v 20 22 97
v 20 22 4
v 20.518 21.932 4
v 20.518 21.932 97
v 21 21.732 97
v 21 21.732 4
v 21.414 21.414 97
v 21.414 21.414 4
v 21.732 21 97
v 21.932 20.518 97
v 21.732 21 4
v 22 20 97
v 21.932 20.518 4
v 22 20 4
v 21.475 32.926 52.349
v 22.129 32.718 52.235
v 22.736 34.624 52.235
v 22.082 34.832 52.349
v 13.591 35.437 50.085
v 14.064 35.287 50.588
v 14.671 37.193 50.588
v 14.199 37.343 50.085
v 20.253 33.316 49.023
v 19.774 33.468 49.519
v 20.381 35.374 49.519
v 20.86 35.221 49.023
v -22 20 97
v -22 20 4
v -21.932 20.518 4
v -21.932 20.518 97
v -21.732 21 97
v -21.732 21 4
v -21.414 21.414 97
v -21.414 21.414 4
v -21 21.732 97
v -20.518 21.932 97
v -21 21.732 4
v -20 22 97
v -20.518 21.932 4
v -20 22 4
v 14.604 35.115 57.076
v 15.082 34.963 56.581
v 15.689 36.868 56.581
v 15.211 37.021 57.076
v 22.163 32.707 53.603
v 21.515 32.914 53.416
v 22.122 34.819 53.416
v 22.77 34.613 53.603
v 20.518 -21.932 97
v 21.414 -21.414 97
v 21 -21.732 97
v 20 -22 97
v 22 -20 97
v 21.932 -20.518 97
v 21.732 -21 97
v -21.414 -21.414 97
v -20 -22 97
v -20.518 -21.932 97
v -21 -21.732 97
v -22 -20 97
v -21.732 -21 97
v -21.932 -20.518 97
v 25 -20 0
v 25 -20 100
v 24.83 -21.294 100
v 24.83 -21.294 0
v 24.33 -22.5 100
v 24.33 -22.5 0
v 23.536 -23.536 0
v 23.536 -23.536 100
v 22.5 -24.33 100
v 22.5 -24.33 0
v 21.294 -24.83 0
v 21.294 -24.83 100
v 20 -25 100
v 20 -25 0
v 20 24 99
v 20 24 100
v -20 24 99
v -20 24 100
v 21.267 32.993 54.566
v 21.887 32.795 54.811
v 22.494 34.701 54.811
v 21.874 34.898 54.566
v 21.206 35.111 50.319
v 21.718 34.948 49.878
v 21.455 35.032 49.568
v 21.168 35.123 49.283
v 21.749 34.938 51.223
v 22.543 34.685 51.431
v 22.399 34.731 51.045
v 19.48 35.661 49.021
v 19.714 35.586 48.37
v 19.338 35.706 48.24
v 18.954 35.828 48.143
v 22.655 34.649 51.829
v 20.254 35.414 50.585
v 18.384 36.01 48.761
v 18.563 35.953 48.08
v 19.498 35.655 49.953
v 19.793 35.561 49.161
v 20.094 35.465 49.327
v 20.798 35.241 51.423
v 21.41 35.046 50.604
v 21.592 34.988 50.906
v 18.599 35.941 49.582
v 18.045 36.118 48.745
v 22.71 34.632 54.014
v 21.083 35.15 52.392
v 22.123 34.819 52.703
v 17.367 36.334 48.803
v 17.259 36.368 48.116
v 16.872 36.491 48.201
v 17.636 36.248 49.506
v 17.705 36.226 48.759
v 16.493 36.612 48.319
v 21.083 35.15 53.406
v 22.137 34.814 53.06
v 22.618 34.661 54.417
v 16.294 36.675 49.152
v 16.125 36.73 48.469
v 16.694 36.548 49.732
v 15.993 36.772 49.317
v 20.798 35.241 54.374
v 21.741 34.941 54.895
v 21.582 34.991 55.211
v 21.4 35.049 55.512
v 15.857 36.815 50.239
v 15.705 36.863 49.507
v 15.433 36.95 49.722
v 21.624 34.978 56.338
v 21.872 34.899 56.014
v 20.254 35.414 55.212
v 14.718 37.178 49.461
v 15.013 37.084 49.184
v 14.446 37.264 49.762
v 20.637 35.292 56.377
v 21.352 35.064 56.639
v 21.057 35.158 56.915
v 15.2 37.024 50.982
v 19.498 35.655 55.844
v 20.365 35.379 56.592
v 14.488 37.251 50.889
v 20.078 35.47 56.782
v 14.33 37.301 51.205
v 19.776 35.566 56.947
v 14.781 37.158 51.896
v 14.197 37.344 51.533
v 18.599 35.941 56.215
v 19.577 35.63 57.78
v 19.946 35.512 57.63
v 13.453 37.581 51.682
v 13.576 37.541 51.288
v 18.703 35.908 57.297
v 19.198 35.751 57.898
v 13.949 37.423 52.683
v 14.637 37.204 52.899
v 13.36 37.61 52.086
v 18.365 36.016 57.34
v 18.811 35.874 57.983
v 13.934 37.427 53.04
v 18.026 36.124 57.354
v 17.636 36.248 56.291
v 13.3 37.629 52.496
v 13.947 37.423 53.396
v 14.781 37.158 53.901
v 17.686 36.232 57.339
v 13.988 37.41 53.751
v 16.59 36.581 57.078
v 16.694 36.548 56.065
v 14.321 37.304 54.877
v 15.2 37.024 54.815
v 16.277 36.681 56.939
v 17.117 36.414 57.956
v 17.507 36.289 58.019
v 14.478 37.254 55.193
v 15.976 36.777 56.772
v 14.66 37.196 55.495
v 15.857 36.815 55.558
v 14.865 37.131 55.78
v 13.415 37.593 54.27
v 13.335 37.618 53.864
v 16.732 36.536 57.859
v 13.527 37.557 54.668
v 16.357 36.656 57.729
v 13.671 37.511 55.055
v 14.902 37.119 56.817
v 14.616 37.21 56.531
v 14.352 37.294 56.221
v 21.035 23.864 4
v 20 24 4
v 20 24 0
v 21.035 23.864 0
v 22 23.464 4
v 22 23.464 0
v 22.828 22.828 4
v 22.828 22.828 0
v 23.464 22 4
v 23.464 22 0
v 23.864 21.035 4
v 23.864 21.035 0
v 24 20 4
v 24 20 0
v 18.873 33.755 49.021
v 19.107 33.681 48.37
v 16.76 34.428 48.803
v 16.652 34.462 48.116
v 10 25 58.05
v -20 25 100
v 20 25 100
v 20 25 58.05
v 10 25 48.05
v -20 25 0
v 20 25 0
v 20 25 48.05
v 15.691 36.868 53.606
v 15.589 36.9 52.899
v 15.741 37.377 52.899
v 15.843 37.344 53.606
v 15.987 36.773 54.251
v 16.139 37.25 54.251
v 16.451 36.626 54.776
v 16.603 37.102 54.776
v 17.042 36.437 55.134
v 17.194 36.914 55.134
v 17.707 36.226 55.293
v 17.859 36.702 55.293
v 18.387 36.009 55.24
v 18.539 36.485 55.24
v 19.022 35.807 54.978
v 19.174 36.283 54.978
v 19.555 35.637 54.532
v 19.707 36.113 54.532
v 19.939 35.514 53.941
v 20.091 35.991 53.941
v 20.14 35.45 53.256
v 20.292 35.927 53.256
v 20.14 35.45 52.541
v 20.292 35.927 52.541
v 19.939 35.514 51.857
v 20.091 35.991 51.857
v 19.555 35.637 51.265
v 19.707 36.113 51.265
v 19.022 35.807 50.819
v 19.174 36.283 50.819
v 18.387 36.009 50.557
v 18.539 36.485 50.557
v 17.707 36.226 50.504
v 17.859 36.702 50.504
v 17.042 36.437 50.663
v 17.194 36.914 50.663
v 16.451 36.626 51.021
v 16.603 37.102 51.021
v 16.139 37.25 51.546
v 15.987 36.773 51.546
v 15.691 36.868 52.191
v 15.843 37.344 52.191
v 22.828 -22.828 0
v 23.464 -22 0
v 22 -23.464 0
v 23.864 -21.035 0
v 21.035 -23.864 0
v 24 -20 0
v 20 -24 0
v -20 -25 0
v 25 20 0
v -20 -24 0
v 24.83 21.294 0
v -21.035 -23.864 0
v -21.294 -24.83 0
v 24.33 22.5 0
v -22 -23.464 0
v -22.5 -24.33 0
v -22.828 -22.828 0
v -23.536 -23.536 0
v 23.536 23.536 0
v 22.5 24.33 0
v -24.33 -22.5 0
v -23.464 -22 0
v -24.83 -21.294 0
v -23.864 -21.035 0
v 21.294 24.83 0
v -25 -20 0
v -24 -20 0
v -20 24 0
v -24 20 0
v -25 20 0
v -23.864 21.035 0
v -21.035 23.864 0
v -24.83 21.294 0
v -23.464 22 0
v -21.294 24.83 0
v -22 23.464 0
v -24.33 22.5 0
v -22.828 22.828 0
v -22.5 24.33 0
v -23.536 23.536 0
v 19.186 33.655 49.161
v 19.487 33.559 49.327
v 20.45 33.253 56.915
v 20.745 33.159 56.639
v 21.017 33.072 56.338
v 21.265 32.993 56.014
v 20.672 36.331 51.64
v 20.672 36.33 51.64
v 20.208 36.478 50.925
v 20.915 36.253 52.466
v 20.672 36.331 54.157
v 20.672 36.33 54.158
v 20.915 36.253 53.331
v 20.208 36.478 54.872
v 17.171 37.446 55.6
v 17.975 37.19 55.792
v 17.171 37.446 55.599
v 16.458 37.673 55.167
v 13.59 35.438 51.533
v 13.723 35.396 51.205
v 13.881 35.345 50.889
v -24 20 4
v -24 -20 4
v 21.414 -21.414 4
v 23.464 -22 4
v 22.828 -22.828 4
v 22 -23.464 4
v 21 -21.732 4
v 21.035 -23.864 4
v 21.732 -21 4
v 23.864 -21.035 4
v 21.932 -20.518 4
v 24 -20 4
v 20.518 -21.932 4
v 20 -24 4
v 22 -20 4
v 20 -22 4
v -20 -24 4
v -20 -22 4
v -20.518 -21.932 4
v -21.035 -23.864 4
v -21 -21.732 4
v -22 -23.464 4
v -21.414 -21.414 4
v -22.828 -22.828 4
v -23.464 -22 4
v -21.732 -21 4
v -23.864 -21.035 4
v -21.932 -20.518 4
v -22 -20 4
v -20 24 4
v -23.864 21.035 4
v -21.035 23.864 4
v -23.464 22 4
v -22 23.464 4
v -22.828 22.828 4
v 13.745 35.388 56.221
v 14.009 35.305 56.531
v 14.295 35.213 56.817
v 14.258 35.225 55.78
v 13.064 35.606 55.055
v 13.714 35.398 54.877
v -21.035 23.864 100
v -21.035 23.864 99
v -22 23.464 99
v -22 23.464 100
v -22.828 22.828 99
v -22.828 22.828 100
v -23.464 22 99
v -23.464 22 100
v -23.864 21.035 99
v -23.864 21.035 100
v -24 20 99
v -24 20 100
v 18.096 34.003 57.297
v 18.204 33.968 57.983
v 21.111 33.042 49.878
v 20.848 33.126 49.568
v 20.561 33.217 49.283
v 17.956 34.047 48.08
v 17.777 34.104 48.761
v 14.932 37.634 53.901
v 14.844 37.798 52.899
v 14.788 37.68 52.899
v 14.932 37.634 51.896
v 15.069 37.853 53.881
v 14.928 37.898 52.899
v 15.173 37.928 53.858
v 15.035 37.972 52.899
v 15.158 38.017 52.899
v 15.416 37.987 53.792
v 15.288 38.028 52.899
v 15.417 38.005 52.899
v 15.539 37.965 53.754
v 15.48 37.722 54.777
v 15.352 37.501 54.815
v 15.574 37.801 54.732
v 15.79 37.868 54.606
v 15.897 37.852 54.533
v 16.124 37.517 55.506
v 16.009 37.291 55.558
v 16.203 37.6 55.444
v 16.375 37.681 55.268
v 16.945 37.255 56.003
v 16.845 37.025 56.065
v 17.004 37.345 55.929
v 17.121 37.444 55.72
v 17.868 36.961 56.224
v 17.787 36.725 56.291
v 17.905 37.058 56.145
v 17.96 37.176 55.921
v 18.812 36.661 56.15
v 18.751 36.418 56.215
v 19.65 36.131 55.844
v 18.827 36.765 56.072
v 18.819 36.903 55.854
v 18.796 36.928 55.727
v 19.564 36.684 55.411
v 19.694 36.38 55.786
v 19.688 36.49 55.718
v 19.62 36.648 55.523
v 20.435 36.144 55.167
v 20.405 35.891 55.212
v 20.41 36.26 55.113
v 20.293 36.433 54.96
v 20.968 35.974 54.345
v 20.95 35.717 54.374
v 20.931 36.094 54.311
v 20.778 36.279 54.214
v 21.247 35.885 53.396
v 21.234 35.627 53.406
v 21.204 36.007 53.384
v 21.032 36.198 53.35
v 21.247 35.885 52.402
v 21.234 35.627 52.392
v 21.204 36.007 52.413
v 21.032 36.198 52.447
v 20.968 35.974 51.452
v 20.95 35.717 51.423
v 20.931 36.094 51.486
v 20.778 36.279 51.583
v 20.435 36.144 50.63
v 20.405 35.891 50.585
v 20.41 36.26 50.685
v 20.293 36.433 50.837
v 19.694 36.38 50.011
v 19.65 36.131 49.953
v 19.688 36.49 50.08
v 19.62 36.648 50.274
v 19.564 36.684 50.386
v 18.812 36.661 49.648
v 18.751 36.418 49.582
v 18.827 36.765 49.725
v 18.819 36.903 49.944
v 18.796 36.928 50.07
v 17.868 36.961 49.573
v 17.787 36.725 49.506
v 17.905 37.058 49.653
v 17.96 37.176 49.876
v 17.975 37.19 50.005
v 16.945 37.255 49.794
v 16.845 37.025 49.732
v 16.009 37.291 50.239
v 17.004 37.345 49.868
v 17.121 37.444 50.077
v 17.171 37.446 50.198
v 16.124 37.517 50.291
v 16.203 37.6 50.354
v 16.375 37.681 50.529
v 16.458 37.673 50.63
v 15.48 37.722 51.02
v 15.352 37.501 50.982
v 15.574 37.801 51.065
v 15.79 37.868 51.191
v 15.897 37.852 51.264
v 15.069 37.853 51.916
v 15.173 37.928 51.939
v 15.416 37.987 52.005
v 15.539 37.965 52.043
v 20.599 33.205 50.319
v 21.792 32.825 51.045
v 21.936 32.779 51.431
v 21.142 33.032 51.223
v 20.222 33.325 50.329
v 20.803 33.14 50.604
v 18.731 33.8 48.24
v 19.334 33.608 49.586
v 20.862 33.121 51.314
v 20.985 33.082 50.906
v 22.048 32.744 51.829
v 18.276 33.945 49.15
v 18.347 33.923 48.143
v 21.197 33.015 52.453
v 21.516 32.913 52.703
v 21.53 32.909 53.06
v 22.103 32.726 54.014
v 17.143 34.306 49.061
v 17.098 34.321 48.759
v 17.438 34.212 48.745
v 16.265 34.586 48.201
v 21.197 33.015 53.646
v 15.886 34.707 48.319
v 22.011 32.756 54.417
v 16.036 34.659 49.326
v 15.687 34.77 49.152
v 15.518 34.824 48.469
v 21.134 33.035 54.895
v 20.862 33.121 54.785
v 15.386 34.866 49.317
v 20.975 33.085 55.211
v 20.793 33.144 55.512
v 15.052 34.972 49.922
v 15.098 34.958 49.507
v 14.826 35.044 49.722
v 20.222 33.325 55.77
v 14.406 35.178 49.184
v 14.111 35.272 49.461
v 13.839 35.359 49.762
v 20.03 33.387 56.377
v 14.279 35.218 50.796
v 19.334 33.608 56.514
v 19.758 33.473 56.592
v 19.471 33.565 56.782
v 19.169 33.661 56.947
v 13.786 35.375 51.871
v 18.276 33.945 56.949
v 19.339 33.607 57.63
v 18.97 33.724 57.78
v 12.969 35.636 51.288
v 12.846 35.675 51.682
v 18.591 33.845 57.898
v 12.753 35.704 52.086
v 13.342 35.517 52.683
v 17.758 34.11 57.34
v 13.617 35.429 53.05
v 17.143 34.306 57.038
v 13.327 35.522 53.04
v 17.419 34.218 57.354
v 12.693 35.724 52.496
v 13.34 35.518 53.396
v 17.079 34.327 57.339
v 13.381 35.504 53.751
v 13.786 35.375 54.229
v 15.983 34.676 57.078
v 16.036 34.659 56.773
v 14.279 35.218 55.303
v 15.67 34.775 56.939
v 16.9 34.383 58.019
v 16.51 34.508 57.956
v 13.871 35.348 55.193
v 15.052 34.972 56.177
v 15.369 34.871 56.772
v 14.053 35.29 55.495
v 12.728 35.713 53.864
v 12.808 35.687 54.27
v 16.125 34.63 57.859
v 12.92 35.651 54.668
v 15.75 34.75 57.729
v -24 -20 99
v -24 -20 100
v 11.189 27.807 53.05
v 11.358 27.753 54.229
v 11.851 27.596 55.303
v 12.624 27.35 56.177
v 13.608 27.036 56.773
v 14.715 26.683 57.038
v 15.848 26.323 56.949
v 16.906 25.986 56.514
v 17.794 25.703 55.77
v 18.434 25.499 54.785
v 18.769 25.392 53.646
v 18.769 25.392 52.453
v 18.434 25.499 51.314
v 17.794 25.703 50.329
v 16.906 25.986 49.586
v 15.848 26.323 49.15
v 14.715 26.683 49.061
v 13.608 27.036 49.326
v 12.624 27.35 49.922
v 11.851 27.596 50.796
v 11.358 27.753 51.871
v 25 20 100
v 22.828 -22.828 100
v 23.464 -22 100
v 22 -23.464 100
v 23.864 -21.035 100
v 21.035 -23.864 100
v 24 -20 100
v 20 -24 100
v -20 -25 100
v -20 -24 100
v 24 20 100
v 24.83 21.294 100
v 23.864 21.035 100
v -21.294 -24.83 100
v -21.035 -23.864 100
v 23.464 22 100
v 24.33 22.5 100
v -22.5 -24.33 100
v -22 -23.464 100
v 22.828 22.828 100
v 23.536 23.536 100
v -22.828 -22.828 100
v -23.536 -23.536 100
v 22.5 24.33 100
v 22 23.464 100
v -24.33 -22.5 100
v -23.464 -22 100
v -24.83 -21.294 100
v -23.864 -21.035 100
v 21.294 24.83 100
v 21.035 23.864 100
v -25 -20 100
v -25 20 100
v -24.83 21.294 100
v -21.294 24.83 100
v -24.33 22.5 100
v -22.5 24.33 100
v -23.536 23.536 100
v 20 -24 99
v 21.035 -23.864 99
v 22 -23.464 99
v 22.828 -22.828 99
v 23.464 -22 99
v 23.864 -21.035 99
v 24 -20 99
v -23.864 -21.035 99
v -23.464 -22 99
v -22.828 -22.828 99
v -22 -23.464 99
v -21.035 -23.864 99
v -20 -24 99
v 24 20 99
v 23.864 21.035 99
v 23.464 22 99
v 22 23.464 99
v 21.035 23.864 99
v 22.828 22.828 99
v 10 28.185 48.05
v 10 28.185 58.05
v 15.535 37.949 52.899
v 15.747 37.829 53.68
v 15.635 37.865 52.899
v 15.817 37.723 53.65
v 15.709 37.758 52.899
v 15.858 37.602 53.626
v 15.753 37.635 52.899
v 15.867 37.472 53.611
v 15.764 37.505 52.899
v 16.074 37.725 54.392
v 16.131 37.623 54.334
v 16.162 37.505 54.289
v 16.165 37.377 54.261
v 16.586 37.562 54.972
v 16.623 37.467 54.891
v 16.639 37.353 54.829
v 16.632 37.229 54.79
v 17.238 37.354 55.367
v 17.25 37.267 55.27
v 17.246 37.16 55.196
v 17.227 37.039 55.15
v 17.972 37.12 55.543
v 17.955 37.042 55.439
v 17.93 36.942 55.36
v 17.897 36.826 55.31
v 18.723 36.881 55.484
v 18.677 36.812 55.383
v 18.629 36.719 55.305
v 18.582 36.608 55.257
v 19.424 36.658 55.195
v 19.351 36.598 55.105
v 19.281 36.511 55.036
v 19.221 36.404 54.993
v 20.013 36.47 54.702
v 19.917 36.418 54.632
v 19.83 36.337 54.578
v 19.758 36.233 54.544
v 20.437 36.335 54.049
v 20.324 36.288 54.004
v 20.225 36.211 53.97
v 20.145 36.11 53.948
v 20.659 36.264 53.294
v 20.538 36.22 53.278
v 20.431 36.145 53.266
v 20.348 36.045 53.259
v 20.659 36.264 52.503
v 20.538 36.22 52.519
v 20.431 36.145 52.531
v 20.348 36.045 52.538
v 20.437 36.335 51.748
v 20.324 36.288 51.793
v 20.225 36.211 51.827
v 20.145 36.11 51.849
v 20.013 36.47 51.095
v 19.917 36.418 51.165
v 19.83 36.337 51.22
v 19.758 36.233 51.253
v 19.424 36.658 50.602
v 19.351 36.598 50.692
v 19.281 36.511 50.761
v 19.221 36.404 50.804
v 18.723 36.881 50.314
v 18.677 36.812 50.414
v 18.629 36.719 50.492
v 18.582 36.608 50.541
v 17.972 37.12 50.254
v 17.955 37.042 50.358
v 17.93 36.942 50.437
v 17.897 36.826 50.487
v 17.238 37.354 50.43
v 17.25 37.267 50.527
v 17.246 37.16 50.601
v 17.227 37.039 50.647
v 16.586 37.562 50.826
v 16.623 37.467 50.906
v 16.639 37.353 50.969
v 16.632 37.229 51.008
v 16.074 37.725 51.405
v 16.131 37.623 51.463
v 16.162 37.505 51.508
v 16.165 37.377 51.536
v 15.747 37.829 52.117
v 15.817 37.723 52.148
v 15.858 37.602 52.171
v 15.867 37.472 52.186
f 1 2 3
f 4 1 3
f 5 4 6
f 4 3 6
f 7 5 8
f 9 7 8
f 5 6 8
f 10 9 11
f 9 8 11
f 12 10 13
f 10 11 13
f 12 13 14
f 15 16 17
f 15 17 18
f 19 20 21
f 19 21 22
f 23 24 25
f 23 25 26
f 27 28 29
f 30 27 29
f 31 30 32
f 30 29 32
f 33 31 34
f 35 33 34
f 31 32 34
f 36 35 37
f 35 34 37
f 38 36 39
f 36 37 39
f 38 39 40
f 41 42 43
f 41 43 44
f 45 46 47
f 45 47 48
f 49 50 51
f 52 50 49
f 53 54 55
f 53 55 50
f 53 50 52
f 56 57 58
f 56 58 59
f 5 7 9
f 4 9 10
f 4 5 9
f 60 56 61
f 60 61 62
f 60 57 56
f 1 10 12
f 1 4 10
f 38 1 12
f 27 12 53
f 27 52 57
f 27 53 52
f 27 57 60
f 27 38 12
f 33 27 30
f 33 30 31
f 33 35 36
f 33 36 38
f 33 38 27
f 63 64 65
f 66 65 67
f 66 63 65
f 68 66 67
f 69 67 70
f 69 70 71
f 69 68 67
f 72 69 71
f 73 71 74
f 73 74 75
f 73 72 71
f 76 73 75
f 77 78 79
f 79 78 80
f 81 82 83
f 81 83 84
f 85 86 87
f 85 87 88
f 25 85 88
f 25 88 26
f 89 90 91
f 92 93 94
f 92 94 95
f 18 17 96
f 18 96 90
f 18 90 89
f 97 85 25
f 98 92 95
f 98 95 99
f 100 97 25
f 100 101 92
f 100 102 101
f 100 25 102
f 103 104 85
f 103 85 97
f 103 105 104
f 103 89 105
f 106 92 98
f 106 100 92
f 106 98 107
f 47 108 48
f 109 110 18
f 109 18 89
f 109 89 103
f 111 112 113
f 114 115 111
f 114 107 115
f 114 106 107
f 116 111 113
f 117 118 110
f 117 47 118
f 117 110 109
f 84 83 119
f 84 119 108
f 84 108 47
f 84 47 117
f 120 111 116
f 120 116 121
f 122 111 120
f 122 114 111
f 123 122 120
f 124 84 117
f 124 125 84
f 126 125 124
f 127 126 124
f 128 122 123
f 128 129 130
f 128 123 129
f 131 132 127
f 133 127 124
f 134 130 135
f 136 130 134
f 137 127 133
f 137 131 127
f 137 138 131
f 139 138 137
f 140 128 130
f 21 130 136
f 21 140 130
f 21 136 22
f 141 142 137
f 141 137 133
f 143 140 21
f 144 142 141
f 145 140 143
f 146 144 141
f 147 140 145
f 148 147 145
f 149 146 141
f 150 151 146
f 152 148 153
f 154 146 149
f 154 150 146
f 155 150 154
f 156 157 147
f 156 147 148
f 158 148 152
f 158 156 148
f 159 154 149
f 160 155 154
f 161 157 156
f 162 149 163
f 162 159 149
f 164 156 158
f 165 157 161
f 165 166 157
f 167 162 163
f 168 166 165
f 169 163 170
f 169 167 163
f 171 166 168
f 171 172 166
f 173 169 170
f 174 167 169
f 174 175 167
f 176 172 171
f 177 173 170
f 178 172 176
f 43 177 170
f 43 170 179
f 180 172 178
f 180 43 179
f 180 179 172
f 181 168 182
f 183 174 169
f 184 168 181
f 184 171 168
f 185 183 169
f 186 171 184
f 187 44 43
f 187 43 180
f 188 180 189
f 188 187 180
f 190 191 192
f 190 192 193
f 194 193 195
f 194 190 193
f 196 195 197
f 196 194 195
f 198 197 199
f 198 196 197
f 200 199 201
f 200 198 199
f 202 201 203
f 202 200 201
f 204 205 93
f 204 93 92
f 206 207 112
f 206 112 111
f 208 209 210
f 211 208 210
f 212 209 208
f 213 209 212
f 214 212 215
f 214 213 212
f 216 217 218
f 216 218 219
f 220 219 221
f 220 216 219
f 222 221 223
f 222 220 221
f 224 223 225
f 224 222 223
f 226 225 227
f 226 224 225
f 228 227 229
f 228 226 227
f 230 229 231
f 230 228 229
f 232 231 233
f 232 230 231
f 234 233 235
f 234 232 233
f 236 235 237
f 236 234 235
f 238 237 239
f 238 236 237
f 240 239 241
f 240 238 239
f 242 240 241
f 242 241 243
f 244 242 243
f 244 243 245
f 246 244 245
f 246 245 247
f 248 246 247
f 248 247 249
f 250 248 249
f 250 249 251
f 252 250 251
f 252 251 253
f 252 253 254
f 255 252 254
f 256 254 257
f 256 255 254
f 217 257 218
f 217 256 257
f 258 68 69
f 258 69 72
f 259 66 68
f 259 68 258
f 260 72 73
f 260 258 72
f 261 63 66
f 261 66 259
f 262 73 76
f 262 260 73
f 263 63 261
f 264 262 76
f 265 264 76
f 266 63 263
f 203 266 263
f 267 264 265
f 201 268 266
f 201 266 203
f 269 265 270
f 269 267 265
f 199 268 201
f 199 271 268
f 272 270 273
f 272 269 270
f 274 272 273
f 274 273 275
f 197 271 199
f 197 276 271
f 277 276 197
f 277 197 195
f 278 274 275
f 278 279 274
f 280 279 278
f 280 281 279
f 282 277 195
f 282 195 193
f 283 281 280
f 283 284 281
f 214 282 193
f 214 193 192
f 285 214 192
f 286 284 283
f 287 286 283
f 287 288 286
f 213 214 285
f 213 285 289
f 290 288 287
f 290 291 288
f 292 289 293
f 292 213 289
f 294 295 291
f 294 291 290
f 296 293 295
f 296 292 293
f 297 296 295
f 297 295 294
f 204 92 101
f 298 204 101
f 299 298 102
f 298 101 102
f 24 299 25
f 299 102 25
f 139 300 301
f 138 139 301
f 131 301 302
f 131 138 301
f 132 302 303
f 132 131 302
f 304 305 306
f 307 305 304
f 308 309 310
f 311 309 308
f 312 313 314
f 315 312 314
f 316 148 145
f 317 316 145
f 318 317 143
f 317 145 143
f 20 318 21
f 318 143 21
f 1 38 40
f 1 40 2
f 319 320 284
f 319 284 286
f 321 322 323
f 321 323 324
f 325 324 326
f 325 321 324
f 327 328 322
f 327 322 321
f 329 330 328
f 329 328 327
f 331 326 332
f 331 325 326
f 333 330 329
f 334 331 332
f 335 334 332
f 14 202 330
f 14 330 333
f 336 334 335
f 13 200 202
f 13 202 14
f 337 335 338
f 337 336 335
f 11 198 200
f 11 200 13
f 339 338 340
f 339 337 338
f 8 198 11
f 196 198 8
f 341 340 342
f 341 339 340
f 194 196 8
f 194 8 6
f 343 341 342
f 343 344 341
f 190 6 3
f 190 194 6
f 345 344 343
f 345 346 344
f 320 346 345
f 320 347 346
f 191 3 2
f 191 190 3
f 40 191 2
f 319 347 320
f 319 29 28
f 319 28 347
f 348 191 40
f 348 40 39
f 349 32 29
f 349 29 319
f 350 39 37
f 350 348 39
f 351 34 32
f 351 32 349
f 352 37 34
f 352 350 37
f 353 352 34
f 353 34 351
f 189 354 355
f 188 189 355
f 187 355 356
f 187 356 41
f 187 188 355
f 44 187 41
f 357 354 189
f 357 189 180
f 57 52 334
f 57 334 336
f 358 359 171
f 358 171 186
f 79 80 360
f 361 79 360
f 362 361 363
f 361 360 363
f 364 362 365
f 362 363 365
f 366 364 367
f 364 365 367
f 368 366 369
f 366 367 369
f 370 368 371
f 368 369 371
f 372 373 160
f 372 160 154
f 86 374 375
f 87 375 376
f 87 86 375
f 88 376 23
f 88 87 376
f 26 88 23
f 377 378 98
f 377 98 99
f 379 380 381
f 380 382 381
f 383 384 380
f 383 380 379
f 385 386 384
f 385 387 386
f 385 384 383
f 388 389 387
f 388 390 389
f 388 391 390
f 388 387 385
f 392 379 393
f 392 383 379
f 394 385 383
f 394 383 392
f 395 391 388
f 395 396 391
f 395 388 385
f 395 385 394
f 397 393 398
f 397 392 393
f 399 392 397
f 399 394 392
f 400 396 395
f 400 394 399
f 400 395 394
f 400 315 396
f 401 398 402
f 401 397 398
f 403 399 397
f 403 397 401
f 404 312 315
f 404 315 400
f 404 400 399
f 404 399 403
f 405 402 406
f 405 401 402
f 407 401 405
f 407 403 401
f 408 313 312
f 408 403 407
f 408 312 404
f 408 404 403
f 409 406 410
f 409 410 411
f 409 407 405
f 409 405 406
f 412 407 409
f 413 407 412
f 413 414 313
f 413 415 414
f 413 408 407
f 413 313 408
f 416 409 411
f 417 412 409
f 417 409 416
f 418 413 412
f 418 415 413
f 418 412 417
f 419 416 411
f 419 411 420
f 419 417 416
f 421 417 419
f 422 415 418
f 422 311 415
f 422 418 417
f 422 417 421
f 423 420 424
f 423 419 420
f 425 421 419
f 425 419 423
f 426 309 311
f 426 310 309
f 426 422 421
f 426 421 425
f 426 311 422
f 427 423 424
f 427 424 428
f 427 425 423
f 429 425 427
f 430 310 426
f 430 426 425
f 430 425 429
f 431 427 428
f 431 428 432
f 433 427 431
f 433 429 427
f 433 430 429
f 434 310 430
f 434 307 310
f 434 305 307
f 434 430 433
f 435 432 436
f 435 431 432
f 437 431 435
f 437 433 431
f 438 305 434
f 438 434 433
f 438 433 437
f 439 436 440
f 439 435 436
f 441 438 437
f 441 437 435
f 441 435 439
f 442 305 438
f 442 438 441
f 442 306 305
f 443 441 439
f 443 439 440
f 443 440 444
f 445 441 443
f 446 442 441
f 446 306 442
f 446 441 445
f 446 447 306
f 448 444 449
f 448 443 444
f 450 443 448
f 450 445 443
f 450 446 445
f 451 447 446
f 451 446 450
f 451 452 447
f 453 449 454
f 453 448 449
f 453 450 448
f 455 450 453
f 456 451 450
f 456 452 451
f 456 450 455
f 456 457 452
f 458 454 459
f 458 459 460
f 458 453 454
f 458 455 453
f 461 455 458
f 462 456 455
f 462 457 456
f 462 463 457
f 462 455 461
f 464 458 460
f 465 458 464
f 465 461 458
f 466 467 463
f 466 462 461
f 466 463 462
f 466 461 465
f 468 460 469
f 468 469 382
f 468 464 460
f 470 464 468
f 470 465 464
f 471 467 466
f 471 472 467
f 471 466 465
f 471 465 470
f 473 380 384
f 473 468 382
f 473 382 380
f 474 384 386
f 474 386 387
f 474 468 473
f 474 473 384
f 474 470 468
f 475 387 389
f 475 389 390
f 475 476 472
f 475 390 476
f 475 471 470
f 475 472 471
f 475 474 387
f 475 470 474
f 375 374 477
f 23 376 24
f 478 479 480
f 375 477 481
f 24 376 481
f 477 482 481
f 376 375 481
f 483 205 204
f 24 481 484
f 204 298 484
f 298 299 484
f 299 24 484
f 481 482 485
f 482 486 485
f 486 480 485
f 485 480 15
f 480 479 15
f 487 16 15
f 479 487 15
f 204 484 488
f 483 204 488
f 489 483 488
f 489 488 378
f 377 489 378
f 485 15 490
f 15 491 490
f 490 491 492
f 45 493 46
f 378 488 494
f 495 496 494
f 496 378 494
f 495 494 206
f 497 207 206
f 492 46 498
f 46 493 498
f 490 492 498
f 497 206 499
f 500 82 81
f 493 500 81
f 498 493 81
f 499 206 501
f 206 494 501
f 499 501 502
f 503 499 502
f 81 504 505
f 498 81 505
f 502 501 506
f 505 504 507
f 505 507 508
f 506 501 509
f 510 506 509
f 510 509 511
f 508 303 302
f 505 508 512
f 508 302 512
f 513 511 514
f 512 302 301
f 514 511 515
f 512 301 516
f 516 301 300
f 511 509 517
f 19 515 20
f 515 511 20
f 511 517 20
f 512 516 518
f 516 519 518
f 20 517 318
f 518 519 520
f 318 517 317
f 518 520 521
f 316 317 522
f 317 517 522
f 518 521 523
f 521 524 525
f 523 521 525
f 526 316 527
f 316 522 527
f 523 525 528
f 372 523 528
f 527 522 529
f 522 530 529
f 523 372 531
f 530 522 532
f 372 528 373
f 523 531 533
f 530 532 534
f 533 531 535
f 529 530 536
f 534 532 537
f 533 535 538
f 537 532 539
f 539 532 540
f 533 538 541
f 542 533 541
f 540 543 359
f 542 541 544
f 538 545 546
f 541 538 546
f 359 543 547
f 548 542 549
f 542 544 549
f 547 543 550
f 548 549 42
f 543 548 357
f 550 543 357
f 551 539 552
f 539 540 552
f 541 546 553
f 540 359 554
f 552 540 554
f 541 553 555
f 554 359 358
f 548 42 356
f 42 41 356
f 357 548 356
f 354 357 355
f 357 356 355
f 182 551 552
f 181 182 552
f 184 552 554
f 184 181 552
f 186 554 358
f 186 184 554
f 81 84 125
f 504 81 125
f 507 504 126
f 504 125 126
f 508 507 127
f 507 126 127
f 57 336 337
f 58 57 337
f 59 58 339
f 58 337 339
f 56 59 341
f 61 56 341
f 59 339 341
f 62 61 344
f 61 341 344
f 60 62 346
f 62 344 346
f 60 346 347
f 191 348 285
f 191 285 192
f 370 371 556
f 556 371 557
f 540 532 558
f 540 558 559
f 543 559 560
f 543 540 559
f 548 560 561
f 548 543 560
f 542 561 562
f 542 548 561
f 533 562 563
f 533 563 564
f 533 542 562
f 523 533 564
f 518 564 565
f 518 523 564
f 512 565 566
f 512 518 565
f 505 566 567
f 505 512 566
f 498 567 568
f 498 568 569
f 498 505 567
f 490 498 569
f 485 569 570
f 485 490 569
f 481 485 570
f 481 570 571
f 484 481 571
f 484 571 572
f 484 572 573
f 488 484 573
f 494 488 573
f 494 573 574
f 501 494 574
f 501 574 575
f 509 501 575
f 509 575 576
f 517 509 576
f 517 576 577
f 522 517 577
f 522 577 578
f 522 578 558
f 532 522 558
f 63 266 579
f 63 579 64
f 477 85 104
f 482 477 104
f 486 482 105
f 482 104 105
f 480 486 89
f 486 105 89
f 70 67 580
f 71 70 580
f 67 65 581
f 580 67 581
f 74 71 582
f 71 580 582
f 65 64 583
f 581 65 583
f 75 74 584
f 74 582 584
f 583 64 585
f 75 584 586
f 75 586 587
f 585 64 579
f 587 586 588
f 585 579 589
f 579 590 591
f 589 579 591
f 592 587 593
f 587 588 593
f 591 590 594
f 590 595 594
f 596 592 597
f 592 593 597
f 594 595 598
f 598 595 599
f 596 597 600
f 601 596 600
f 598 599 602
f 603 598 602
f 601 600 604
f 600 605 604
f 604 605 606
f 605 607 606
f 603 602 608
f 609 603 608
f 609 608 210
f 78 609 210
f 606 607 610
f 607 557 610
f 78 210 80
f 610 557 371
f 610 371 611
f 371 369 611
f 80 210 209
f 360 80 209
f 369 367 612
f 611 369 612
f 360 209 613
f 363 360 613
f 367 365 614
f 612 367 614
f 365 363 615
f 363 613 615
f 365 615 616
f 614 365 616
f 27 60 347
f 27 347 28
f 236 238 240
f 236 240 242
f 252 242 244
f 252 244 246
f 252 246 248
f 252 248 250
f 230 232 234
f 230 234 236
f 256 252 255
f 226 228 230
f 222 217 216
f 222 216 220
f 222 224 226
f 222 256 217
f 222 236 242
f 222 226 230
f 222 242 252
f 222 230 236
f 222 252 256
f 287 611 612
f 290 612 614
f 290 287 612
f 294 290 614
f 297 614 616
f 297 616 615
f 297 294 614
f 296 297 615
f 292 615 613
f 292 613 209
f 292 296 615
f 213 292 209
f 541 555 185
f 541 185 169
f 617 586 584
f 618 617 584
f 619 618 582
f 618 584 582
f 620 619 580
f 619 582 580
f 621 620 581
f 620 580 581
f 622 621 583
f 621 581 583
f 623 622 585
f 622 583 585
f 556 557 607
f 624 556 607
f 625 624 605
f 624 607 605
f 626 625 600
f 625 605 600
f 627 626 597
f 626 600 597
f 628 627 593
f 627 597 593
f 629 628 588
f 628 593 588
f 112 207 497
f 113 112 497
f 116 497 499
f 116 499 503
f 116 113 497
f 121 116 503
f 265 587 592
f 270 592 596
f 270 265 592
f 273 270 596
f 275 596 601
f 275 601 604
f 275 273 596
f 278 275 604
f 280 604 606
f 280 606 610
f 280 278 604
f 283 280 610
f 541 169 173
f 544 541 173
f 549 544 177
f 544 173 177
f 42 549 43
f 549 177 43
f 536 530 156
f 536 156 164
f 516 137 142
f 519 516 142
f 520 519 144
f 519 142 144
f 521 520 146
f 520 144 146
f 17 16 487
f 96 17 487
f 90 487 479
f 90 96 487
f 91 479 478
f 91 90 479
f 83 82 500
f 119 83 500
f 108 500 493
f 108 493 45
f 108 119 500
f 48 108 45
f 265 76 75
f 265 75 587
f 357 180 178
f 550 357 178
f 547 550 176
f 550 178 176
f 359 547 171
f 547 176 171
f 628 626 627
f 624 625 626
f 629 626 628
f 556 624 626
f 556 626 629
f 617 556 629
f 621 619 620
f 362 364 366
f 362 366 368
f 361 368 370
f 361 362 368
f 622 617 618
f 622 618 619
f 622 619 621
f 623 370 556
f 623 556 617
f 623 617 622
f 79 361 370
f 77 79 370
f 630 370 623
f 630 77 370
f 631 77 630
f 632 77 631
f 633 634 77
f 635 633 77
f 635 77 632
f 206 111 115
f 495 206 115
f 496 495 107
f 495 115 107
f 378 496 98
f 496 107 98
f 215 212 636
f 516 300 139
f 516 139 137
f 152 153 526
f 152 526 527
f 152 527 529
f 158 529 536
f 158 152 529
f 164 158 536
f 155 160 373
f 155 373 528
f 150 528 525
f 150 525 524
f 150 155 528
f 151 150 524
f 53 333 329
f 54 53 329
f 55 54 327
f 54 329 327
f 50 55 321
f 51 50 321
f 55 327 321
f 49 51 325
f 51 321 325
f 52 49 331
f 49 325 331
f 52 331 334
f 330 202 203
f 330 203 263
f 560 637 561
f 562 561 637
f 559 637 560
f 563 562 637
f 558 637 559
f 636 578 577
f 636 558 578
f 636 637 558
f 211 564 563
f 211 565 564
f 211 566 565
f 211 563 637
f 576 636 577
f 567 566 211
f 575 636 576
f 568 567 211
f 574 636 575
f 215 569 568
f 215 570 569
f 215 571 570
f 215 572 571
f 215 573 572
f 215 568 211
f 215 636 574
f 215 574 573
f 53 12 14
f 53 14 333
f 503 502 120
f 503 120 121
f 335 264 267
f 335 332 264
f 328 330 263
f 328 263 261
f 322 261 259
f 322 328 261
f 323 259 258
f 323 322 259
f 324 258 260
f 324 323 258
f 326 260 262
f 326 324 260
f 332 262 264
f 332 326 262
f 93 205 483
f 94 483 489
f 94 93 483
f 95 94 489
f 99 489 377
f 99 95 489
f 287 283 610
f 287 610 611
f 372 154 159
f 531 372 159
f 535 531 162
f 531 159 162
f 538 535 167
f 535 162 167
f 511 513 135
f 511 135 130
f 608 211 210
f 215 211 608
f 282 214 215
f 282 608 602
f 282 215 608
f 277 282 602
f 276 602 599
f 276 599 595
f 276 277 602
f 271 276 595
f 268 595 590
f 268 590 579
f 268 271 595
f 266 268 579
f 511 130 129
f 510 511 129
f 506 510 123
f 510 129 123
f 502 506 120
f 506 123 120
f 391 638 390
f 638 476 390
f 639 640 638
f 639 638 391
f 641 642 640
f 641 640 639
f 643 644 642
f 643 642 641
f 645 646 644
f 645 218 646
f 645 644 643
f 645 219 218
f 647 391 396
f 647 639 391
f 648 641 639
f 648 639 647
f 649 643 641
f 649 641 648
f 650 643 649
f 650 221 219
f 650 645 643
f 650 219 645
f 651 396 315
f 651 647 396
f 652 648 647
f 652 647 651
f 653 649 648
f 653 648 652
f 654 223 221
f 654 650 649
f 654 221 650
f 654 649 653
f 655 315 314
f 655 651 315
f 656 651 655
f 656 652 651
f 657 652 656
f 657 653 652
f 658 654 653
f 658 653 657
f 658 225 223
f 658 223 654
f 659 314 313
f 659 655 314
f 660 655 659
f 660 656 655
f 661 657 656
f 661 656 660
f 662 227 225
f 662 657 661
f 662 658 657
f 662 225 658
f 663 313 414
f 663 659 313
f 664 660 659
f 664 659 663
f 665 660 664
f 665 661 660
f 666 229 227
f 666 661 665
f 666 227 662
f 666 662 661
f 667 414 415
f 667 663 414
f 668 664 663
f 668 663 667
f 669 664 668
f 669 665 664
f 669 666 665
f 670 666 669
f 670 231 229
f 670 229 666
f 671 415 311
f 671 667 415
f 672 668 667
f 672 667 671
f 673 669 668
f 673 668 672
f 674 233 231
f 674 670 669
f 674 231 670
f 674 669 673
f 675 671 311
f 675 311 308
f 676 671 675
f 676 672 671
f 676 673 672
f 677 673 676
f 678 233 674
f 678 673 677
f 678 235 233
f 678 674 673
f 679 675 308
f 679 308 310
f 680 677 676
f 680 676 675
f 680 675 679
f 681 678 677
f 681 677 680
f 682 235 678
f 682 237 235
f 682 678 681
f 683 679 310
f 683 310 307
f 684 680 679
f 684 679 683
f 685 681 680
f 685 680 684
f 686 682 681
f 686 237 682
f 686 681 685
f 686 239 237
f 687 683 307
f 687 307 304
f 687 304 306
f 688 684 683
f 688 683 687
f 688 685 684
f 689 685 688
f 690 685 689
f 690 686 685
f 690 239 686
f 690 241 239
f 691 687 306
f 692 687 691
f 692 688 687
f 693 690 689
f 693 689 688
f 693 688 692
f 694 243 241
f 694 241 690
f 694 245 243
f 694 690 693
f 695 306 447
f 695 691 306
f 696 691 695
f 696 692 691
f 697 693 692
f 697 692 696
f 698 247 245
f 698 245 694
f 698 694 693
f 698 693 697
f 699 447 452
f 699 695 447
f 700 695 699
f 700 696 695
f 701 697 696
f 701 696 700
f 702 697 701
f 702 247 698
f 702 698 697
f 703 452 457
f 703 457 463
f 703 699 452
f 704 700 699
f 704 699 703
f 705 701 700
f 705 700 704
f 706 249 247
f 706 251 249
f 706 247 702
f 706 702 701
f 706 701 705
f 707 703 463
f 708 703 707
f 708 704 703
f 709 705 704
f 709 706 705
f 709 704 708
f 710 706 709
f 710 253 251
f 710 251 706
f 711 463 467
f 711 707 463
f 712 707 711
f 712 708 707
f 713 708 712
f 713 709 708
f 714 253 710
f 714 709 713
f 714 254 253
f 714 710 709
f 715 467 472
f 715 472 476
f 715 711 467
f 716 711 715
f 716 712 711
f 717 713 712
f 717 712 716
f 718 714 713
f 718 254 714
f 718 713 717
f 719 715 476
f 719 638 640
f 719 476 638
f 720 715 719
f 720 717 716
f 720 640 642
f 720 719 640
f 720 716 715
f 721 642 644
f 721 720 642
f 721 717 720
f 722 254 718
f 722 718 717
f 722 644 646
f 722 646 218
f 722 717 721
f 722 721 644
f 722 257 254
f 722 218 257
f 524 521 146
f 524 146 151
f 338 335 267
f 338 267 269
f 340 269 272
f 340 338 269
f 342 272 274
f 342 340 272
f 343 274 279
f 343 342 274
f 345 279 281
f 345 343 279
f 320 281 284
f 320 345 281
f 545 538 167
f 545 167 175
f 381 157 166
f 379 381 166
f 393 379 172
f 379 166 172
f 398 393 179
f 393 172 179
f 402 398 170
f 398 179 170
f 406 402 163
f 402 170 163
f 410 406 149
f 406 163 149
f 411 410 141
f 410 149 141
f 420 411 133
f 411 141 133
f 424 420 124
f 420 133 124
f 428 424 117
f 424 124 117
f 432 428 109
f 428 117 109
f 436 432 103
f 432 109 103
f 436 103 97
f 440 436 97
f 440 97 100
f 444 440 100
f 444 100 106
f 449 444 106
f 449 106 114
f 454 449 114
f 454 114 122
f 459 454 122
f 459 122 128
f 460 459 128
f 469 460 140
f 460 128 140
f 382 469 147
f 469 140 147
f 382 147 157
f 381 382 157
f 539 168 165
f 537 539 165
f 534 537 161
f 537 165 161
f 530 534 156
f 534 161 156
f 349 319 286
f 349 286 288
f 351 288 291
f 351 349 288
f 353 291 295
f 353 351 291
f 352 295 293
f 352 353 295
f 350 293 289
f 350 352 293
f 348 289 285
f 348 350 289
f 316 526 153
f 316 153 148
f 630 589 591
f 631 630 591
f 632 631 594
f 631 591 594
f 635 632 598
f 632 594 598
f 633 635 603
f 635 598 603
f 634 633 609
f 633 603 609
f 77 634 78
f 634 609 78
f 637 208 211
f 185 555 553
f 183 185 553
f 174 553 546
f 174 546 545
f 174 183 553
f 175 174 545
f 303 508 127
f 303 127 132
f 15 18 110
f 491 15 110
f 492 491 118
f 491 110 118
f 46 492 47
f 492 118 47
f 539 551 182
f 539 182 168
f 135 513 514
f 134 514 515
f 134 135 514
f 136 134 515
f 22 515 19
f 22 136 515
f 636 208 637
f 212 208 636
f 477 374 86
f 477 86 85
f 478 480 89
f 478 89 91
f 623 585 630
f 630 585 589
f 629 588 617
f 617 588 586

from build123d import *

# Parameters (mm, degrees)
BOSS_EXTRUDE1_DEPTH = 100
SHELL9_T            = -3
CUT_EXTRUDE1_DEPTH  = 1
CUT_EXTRUDE2_START  = -1
CUT_EXTRUDE2_DEPTH  = 1
SKETCH4_W           = 10
SKETCH4_H           = 10
BOSS_EXTRUDE2_DEPTH = 5
CUT_EXTRUDE5_DEPTH  = 10
SKETCH6_W           = 10.495090221
SKETCH6_H           = 10
BOSS_EXTRUDE3_DEPTH = 10
SKETCH7_W           = 10.495090221
SKETCH7_H           = 10
SKETCH7_R           = 4
CUT_EXTRUDE6_DEPTH  = 10
SKETCH8_R           = 5
BOSS_EXTRUDE4_DEPTH = 2
CUT_EXTRUDE7_DEPTH  = 2
CIRPATTERN1_COUNT   = 12
SKETCH10_R          = 3.401579871
SKETCH10_R_2        = 2.401579871
BOSS_EXTRUDE5_DEPTH = 1
FILLET2_R           = 0.5
FILLET3_R           = 0.5
CUT_EXTRUDE8_START  = -3
CUT_EXTRUDE8_DEPTH  = 3


with BuildPart() as part:
    # Sketch1 → Boss-Extrude1 (new body)
    with BuildSketch(Plane.XY):
        with BuildLine():
            Line((-20, 25), (20, 25))
            ThreePointArc((20, 25), (23.535533906, 23.535533906), (25, 20))
            Line((25, 20), (25, -20))
            ThreePointArc((25, -20), (23.535533906, -23.535533906), (20, -25))
            Line((20, -25), (-20, -25))
            ThreePointArc((-20, -25), (-23.535533906, -23.535533906), (-25, -20))
            Line((-25, -20), (-25, 20))
            ThreePointArc((-25, 20), (-23.535533906, 23.535533906), (-20, 25))
        make_face()
    extrude(amount=BOSS_EXTRUDE1_DEPTH)

    # Shell9
    shell9_openings = [part.faces().sort_by_distance(p)[0] for p in [
        (0, 0, 0),
    ]]
    offset(amount=SHELL9_T, openings=shell9_openings, kind=Kind.INTERSECTION)

    # Sketch2 → Cut-Extrude1 (cut)
    with BuildSketch(Plane.XY.offset(100)):
        with BuildLine():
            Line((24, -20), (24, 20))
            ThreePointArc((24, 20), (22.828427125, 22.828427125), (20, 24))
            Line((20, 24), (-20, 24))
            ThreePointArc((-20, 24), (-22.828427125, 22.828427125), (-24, 20))
            Line((-24, 20), (-24, -20))
            ThreePointArc((-24, -20), (-22.828427125, -22.828427125), (-20, -24))
            Line((-20, -24), (20, -24))
            ThreePointArc((20, -24), (22.828427125, -22.828427125), (24, -20))
        make_face()
    extrude(amount=-CUT_EXTRUDE1_DEPTH, mode=Mode.SUBTRACT)

    # Sketch3 → Cut-Extrude2 (cut)
    with BuildSketch(Plane(origin=(0, 0, 0), x_dir=(-1, 0, 0), z_dir=(0, 0, -1)).offset(CUT_EXTRUDE2_START)):
        with BuildLine():
            Line((-20, -24), (20, -24))
            ThreePointArc((20, -24), (22.828427125, -22.828427125), (24, -20))
            Line((24, -20), (24, 20))
            ThreePointArc((24, 20), (22.828427125, 22.828427125), (20, 24))
            Line((20, 24), (-20, 24))
            ThreePointArc((-20, 24), (-22.828427125, 22.828427125), (-24, 20))
            Line((-24, 20), (-24, -20))
            ThreePointArc((-24, -20), (-22.828427125, -22.828427125), (-20, -24))
        make_face()
    extrude(amount=CUT_EXTRUDE2_DEPTH, mode=Mode.SUBTRACT)

    # Sketch4 → Boss-Extrude2 (add)
    with BuildSketch(Plane(origin=(0, 25, 0), x_dir=(1, 0, 0), z_dir=(0, 1, 0))):
        with Locations((15, -53.049640043)):
            Rectangle(SKETCH4_W, SKETCH4_H)
    extrude(amount=BOSS_EXTRUDE2_DEPTH)

    # Sketch5 → Cut-Extrude5 (cut)
    with BuildSketch(Plane.XY.offset(58.049640043)):
        Polygon((10, 28.185422855), (20, 25), (20, 30), (10, 30), align=None)
    extrude(amount=-CUT_EXTRUDE5_DEPTH, mode=Mode.SUBTRACT)

    # Sketch6 → Boss-Extrude3 (add)
    with BuildSketch(Plane(origin=(9.072374427, 28.480910825, 0), x_dir=(0.9528264920711829, -0.3035155284451262, 0), z_dir=(0.3035155284451262, 0.9528264920711829, 0))):
        with Locations((6.22109652, -53.049640043)):
            Rectangle(SKETCH6_W, SKETCH6_H)
    extrude(amount=BOSS_EXTRUDE3_DEPTH)

    # Sketch7 → Cut-Extrude6 (cut)
    with BuildSketch(Plane(origin=(12.107529711, 38.009175746, 0), x_dir=(0.9528264920711829, -0.30351552844512614, 0), z_dir=(0.30351552844512614, 0.952826492071183, 0))):
        with Locations((6.22109652, -53.049640043)):
            Rectangle(SKETCH7_W, SKETCH7_H)
        with Locations(Location((6.221096519, -53.049640043, 0), (0, 0, 180))):
            Circle(SKETCH7_R, mode=Mode.SUBTRACT)
    extrude(amount=-CUT_EXTRUDE6_DEPTH, mode=Mode.SUBTRACT)

    # Sketch8 → Boss-Extrude4 (add)
    with BuildSketch(Plane(origin=(12.107529711, 38.009175746, 0), x_dir=(0.9528264920711829, -0.30351552844512614, 0), z_dir=(0.30351552844512614, 0.952826492071183, 0))):
        with Locations(Location((6.221096519, -53.049640043, 0), (0, 0, 180))):
            Circle(SKETCH8_R)
    extrude(amount=-BOSS_EXTRUDE4_DEPTH)

    # Sketch9 → Cut-Extrude7 (cut)
    with BuildSketch(Plane(origin=(12.107529711, 38.009175746, 0), x_dir=(0.9528264920711829, -0.30351552844512614, 0), z_dir=(0.30351552844512614, 0.952826492071183, 0))):
        with BuildLine():
            ThreePointArc((1.251860541, -52.495840627), (1.222824963, -53.18109898), (1.287841277, -53.863883686))
            Line((1.287841277, -53.863883686), (1.974013697, -53.750629555))
            ThreePointArc((1.974013697, -53.750629555), (1.919851851, -53.218142557), (1.932190971, -52.683050363))
            Line((1.932190971, -52.683050363), (1.251860541, -52.495840627))
        make_face()
    cut_extrude7 = extrude(amount=-CUT_EXTRUDE7_DEPTH, mode=Mode.SUBTRACT)

    # CirPattern1: Cut-Extrude7 ×12 about axis
    cirpattern1_axis = Axis((5.927625573, -1.888199398, 53.049640043), (0.30351552844512614, 0.9528264920711829, 0))
    for i in range(1, CIRPATTERN1_COUNT):
        add(cut_extrude7.rotate(cirpattern1_axis, i * 360 / CIRPATTERN1_COUNT), mode=Mode.SUBTRACT)

    # Sketch10 → Boss-Extrude5 (add)
    with BuildSketch(Plane(origin=(12.107529711, 38.009175746, 0), x_dir=(0.9528264920711829, -0.30351552844512614, 0), z_dir=(0.30351552844512614, 0.952826492071183, 0))):
        with Locations(Location((6.055914609, -52.898554166, 0), (0, 0, 180))):
            Circle(SKETCH10_R)
        with Locations(Location((6.055914609, -52.898554166, 0), (0, 0, 180))):
            Circle(SKETCH10_R_2, mode=Mode.SUBTRACT)
    extrude(amount=BOSS_EXTRUDE5_DEPTH)

    # Fillet2
    fillet2_edges = [part.edges().sort_by_distance(p)[0] for p in [
        (21.422396529, 36.091505803, 52.898554166),
    ]]
    fillet(fillet2_edges, radius=FILLET2_R)

    # Fillet3
    fillet3_edges = [part.edges().sort_by_distance(p)[0] for p in [
        (20.469570037, 36.395021331, 52.898554166),
    ]]
    fillet(fillet3_edges, radius=FILLET3_R - 0.0001)  # a hair under: the kernel refuses the full size

    # Sketch12 → Cut-Extrude8 (cut)
    with BuildSketch(Plane(origin=(0, 0, 1), x_dir=(-1, 0, 0), z_dir=(0, 0, -1)).offset(CUT_EXTRUDE8_START)):
        with BuildLine():
            Line((-20, -24), (20, -24))
            ThreePointArc((20, -24), (22.828427125, -22.828427125), (24, -20))
            Line((24, -20), (24, 20))
            ThreePointArc((24, 20), (22.828427125, 22.828427125), (20, 24))
            Line((20, 24), (-20, 24))
            ThreePointArc((-20, 24), (-22.828427125, 22.828427125), (-24, 20))
            Line((-24, 20), (-24, -20))
            ThreePointArc((-24, -20), (-22.828427125, -22.828427125), (-20, -24))
        make_face()
    extrude(amount=CUT_EXTRUDE8_DEPTH, mode=Mode.SUBTRACT)


solid = part.part
